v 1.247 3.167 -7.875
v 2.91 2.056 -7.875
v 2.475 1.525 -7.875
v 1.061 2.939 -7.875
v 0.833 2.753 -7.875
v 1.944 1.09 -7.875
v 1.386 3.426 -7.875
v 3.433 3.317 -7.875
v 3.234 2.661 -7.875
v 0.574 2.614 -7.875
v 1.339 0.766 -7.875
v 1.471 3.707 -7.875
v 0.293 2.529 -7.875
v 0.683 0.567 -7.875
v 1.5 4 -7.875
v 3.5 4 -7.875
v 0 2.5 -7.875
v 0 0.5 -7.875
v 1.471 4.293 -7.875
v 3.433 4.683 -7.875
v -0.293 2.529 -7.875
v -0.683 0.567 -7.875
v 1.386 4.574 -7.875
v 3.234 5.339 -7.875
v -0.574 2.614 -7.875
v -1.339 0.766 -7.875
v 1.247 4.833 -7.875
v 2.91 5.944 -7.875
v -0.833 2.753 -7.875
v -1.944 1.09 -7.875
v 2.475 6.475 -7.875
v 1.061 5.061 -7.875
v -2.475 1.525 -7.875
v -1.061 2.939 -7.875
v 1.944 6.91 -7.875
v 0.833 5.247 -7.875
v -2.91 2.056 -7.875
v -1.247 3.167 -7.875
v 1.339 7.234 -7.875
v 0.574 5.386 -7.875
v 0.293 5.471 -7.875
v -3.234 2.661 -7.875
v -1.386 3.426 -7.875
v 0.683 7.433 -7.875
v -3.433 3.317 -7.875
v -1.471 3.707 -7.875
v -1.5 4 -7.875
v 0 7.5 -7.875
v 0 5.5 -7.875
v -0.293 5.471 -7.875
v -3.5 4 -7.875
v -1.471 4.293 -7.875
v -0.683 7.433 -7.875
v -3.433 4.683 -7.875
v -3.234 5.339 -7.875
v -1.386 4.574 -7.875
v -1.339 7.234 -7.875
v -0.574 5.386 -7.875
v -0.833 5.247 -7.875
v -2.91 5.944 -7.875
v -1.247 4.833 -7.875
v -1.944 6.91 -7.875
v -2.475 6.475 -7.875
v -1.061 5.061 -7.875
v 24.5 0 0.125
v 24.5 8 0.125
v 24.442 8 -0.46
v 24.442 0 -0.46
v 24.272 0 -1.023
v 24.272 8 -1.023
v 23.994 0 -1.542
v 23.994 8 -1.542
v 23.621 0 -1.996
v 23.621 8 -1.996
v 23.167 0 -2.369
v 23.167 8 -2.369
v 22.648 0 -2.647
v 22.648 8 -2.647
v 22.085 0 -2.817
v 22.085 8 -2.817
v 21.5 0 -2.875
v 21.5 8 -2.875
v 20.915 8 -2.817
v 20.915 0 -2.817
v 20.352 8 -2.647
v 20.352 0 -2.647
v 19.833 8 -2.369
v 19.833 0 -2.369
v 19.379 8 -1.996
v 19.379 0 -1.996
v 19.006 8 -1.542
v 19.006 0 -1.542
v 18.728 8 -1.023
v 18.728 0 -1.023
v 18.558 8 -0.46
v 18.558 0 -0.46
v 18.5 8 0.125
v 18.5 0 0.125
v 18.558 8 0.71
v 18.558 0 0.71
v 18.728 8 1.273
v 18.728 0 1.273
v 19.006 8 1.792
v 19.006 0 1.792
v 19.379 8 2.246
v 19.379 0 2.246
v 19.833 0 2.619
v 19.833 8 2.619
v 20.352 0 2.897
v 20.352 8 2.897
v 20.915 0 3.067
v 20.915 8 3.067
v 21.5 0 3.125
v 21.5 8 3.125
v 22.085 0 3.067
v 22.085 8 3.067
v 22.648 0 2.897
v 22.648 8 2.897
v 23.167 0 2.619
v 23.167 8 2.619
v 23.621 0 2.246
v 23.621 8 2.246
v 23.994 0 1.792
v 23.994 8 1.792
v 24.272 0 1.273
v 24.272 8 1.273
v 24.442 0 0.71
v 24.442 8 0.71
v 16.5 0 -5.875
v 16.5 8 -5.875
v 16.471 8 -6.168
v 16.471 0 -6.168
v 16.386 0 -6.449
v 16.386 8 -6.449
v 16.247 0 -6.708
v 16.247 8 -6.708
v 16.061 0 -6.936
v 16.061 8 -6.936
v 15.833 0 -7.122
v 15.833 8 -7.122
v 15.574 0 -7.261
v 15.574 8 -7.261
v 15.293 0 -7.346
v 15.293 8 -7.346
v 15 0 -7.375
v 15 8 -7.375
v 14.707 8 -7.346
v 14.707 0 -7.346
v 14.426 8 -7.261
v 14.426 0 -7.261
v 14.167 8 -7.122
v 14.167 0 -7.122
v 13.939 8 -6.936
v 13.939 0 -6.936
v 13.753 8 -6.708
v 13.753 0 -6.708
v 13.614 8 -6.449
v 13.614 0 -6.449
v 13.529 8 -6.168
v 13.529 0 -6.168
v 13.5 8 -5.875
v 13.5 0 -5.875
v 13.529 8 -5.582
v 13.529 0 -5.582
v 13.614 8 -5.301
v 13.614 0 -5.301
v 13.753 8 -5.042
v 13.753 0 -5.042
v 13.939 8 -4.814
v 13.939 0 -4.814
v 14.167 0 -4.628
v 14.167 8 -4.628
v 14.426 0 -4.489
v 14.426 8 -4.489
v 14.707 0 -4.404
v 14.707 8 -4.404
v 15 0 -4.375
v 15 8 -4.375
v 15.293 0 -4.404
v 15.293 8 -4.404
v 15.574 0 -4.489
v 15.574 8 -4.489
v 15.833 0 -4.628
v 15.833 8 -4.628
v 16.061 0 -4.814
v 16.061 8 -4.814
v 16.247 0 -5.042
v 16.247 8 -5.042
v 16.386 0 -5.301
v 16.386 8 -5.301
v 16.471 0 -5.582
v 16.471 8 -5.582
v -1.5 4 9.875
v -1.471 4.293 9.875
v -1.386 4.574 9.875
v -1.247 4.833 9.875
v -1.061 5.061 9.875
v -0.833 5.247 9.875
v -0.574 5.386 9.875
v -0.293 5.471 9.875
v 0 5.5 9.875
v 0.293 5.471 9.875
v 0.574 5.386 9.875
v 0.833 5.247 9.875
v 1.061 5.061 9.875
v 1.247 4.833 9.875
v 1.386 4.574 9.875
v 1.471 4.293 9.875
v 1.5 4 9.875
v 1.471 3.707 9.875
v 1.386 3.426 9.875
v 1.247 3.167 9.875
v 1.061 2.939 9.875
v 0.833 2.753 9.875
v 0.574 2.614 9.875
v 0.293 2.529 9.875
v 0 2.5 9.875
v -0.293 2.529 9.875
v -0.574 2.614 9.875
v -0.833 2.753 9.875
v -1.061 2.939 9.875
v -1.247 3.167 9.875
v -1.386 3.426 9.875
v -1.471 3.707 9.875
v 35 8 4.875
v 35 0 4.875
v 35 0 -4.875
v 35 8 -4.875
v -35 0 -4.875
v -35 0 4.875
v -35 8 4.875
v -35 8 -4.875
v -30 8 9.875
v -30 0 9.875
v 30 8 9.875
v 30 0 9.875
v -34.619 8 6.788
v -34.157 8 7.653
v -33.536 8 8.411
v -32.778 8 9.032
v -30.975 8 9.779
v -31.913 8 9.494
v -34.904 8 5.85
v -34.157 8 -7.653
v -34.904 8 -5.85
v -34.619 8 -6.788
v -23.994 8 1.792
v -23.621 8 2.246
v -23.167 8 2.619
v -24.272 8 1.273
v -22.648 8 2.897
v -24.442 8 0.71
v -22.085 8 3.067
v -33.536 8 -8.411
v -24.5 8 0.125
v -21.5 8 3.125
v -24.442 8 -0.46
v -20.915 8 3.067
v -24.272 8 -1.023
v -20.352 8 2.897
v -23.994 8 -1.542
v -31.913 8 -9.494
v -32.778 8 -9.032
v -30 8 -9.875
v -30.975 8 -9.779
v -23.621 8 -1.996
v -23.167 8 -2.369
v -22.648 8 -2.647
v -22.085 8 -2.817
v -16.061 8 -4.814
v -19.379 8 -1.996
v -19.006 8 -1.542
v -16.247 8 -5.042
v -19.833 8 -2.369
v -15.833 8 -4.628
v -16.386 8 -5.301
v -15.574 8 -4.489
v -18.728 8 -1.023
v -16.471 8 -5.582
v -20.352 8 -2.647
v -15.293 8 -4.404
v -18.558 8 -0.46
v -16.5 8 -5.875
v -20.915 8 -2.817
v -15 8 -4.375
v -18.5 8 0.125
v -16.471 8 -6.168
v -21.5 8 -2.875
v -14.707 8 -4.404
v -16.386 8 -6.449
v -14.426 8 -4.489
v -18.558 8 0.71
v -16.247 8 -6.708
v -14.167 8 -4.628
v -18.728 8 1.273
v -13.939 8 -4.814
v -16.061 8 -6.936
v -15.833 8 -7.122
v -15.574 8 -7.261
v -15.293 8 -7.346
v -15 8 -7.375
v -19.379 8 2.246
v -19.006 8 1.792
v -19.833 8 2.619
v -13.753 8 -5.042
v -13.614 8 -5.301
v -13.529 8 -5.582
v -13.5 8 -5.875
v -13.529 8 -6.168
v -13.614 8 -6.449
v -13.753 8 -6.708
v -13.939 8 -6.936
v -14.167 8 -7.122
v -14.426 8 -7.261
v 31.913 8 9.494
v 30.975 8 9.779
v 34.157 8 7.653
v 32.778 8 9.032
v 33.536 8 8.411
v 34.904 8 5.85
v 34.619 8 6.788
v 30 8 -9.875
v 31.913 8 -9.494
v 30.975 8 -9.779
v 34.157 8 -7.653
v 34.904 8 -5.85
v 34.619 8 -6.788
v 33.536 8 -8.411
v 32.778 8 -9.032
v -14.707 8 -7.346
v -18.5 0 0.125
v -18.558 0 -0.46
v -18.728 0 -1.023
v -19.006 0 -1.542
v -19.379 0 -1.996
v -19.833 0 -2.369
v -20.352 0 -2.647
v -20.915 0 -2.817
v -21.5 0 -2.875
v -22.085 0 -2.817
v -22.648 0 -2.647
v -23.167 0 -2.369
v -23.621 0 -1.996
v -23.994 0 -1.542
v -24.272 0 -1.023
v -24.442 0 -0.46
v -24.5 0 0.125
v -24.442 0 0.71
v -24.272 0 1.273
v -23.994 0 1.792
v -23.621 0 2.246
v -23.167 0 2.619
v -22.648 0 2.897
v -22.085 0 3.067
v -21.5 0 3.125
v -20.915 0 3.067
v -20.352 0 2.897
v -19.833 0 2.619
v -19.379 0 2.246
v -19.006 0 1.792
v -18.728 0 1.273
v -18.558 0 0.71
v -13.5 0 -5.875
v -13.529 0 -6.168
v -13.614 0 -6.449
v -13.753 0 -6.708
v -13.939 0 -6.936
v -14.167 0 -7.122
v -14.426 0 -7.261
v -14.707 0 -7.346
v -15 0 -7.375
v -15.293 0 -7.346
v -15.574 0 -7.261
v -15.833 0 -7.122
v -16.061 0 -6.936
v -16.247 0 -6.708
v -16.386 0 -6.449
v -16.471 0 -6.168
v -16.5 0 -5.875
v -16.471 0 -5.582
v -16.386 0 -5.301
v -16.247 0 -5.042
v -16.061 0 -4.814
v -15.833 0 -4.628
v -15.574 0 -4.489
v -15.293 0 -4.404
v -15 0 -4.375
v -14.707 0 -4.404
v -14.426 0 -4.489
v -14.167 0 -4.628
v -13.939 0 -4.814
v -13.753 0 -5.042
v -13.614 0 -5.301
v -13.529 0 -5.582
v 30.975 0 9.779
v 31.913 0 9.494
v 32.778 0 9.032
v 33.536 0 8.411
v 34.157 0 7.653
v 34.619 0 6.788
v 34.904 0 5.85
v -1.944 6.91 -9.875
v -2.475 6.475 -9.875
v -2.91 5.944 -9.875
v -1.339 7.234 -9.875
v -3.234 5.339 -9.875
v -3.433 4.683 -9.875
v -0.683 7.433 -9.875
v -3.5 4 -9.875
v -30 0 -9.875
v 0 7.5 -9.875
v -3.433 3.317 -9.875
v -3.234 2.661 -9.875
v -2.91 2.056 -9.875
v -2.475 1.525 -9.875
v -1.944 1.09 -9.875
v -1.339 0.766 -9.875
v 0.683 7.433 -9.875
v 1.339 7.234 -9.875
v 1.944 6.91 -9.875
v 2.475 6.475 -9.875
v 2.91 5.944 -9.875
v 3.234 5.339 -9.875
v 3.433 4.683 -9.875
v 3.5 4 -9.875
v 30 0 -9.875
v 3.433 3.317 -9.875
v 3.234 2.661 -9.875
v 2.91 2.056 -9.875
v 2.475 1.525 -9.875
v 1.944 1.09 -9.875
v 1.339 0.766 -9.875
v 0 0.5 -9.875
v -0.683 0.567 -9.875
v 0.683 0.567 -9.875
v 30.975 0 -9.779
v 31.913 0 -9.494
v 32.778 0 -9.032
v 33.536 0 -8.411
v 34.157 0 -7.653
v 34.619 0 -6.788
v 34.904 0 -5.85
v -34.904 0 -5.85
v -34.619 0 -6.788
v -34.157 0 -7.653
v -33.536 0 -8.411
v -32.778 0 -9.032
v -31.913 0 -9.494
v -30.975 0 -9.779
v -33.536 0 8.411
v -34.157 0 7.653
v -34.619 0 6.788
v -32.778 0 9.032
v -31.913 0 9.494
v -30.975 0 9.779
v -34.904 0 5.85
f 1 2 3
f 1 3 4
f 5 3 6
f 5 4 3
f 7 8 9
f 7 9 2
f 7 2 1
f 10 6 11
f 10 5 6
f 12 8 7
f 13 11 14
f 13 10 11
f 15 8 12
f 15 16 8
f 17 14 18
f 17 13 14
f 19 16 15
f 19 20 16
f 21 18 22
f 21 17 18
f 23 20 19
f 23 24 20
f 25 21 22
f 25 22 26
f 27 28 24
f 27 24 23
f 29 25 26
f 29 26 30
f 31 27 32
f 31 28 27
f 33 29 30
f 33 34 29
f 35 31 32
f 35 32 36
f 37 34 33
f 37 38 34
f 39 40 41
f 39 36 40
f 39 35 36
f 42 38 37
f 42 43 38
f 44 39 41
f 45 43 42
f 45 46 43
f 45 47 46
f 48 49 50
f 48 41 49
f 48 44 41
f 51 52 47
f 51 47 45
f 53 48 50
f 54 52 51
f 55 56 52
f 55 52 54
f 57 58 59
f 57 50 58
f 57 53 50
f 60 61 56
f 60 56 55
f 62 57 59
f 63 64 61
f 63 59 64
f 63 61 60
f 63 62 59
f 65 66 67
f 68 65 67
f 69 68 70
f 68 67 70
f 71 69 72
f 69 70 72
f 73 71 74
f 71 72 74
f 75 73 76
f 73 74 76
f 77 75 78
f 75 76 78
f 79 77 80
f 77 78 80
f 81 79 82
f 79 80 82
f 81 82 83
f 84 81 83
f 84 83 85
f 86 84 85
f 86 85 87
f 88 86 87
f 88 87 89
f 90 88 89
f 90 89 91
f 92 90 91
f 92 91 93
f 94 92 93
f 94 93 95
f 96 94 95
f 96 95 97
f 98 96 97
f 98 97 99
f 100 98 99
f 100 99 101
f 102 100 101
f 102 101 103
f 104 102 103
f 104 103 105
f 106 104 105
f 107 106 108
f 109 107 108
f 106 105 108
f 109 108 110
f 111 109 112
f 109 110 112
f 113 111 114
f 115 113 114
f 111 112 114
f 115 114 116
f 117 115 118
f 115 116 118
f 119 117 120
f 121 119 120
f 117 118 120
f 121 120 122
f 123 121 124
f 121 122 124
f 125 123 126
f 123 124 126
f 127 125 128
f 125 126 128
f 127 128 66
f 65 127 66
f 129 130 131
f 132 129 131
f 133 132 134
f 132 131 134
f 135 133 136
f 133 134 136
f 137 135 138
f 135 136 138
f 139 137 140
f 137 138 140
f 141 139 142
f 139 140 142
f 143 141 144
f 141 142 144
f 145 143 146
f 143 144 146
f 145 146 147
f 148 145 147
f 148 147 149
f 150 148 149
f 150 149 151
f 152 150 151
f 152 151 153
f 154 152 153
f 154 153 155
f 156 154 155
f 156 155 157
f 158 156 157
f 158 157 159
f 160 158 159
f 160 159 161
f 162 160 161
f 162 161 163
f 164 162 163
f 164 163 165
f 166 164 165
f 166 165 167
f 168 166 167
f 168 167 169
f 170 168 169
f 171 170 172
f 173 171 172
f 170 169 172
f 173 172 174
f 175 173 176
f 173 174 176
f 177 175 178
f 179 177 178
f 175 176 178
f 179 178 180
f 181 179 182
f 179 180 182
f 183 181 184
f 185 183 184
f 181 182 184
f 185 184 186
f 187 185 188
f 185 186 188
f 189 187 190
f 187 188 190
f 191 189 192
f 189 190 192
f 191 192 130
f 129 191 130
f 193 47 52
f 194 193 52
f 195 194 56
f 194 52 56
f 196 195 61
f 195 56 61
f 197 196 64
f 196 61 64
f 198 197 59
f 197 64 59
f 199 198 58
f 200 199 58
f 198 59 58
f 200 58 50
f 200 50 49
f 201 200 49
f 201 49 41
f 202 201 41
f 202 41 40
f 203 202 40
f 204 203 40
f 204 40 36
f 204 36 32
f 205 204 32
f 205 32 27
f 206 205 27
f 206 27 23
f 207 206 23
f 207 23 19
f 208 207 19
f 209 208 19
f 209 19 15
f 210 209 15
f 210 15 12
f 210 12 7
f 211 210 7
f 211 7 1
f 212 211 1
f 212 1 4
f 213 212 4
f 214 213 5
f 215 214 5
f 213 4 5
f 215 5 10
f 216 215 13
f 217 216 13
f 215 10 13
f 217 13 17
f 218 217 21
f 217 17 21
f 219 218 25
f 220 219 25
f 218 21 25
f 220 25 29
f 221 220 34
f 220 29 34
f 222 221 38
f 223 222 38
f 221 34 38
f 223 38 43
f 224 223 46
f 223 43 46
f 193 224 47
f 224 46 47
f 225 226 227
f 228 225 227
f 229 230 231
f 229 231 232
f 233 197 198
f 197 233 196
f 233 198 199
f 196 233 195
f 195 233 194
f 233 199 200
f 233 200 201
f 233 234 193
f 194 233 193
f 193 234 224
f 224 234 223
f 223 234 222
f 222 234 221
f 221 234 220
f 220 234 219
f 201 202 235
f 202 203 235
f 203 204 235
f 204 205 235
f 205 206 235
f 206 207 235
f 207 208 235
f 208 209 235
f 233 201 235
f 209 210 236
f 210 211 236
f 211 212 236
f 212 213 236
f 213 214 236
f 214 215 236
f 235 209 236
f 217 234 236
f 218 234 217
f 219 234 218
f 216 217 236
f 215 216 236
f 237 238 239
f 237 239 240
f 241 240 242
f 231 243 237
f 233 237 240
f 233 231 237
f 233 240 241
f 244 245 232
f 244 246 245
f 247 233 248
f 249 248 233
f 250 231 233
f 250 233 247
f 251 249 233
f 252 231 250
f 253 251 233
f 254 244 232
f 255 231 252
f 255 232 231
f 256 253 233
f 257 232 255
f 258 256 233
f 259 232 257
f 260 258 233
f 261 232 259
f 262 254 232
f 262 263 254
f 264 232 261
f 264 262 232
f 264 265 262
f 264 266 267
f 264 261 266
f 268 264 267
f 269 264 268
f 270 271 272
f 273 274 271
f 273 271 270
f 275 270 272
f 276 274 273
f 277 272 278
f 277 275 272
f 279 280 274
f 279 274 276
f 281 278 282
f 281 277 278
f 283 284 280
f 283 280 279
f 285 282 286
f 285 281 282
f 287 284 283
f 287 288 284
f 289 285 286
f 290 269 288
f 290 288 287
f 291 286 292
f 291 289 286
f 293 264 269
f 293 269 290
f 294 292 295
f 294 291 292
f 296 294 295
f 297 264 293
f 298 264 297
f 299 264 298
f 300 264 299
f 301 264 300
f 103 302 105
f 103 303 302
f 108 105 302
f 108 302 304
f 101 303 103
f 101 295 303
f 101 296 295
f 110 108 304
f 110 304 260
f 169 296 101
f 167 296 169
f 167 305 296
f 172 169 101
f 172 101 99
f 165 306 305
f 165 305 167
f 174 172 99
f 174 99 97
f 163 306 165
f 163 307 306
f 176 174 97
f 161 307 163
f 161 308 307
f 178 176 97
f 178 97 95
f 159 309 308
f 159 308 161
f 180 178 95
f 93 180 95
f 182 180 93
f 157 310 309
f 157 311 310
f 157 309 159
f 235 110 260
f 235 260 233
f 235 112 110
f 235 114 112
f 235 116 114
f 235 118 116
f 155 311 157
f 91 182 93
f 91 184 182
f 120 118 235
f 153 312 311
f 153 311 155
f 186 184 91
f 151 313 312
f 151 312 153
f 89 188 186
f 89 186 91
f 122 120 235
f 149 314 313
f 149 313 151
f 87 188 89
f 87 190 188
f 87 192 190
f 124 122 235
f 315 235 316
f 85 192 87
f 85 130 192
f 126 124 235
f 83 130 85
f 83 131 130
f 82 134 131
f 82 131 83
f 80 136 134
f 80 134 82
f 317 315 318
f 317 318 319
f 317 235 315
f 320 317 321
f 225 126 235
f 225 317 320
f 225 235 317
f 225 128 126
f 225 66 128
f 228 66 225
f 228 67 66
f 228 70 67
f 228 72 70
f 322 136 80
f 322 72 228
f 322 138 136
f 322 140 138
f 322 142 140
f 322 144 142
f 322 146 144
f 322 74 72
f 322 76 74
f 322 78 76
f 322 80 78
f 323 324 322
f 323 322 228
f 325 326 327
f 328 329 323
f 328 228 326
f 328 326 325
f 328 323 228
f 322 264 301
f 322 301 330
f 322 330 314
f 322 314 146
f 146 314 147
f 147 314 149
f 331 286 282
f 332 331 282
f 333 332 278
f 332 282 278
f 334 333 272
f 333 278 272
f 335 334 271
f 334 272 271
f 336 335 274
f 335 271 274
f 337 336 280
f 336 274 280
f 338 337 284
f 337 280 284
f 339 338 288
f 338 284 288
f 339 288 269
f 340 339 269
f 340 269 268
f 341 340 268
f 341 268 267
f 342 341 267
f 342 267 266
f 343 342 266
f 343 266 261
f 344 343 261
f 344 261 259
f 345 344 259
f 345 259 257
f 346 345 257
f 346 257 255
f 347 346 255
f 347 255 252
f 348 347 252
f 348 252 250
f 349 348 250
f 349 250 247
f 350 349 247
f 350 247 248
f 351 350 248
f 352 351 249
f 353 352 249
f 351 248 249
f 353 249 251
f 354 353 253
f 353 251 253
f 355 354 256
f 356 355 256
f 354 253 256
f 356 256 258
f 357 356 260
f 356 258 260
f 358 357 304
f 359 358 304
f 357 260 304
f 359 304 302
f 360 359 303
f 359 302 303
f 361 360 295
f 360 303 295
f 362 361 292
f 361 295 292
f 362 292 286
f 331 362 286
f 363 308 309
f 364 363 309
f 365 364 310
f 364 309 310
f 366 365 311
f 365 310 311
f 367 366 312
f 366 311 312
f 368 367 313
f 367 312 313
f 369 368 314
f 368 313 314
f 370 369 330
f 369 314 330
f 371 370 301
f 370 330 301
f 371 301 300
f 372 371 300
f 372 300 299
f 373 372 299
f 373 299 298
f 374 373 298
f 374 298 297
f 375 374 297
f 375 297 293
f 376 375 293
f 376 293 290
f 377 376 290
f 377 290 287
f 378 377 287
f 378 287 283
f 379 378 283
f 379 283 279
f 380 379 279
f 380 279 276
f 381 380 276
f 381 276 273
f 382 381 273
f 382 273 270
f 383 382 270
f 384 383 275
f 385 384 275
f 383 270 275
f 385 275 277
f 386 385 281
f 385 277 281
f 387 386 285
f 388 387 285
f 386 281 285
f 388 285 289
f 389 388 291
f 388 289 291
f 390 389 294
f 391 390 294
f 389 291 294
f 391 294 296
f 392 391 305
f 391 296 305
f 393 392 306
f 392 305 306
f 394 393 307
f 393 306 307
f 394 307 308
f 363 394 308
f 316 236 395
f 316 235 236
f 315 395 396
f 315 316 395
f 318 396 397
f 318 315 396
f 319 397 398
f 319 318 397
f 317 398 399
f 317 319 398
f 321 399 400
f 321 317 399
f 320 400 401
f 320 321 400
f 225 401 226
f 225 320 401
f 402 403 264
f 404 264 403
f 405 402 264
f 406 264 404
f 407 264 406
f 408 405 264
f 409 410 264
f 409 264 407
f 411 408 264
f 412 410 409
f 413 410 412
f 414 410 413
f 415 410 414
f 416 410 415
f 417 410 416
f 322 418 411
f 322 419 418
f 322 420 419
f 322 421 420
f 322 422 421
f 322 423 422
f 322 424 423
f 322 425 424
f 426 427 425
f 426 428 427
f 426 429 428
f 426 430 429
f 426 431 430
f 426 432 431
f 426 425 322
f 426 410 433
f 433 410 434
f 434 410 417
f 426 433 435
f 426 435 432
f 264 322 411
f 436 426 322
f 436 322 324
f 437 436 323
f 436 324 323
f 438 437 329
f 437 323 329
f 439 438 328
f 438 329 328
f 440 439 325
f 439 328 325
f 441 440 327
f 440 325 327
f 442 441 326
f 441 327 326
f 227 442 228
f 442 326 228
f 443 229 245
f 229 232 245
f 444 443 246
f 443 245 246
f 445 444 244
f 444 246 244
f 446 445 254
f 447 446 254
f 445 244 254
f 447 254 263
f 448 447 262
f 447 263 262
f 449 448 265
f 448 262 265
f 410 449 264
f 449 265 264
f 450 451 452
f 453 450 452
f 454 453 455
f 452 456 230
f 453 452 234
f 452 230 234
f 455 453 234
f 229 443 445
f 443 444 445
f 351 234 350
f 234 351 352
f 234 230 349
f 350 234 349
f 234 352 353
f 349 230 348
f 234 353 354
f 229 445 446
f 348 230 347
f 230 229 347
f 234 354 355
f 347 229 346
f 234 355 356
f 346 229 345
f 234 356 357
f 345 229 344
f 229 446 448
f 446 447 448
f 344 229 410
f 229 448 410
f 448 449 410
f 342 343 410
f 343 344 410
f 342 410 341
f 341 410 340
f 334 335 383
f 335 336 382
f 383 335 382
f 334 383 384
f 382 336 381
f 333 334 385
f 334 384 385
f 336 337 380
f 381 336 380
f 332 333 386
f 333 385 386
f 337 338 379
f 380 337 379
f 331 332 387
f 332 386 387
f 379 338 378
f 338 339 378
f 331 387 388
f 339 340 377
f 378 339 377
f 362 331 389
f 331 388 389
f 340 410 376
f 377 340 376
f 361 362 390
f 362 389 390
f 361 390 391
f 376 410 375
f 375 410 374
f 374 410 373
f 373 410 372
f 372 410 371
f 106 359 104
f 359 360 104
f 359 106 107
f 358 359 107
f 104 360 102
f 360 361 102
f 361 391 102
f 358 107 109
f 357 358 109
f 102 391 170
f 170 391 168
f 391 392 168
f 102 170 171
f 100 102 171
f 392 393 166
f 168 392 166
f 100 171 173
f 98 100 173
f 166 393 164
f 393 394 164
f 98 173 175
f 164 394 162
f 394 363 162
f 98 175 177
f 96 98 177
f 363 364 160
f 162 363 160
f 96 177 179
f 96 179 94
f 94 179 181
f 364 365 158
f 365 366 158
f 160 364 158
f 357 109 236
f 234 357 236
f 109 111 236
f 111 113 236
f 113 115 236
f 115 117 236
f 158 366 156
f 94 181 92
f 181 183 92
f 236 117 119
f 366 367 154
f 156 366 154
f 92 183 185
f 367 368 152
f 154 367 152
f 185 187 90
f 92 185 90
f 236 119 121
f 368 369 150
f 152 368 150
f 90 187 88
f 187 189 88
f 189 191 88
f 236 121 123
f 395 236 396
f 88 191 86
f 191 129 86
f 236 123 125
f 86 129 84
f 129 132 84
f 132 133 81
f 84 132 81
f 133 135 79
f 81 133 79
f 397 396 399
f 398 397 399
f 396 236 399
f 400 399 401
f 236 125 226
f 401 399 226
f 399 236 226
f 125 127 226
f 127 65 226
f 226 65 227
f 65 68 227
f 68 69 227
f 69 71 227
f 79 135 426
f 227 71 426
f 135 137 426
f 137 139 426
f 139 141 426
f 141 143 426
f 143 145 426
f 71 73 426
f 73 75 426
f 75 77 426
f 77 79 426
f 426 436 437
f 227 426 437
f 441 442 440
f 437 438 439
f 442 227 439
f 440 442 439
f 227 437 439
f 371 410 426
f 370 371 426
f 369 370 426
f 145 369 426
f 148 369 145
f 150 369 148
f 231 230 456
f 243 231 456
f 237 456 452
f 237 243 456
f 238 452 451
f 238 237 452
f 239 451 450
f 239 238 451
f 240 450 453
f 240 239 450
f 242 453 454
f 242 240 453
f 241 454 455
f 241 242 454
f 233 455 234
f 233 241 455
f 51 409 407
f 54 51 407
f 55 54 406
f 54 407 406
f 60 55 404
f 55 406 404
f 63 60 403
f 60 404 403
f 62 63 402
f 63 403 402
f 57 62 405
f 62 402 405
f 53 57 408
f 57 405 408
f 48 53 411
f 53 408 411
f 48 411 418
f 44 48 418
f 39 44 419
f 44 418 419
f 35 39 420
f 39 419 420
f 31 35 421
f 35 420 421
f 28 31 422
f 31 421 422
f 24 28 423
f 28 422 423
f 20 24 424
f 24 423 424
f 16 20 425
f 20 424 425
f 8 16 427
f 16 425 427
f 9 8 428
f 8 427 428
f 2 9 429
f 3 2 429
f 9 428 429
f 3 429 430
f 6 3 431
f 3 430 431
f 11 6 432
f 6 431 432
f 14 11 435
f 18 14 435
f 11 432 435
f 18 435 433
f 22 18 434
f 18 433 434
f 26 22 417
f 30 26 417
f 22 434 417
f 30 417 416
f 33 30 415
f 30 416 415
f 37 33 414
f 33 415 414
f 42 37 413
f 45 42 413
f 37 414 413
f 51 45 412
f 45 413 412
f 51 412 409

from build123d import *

# Parameters (mm, degrees)
SKETCH_1_W          = 70
SKETCH_1_H          = 19.75
EXTRUDE_1_DEPTH     = 8
SKETCH_2_R          = 3
CUT_EXTRUDE_1_DEPTH = 9
SKETCH_9_R          = 1.5
CUT_EXTRUDE_7_DEPTH = 9
SKETCH_10_R         = 1.5
CUT_EXTRUDE_8_DEPTH = 20.75
FILLET_1_R          = 5
SKETCH_11_R         = 3.5
CUT_EXTRUDE_9_DEPTH = 2


with BuildPart() as part:
    # 草图1 → 凸台-拉伸1 (new body)
    with BuildSketch(Plane(origin=(0, 0, 0), x_dir=(1, 0, 0), z_dir=(0, 1, 0))):
        Rectangle(SKETCH_1_W, SKETCH_1_H)
    extrude(amount=EXTRUDE_1_DEPTH)

    # 草图2 → 切除-拉伸1 (cut, through all)
    with BuildSketch(Plane(origin=(0, 8, 0), x_dir=(1, 0, 0), z_dir=(0, 1, 0))):
        with Locations((-21.5, -0.125)):
            Circle(SKETCH_2_R)
        with Locations((21.5, -0.125)):
            Circle(SKETCH_2_R)
    extrude(amount=-CUT_EXTRUDE_1_DEPTH, mode=Mode.SUBTRACT)

    # 草图9 → 切除-拉伸7 (cut, through all)
    with BuildSketch(Plane(origin=(0, 8, 0), x_dir=(1, 0, 0), z_dir=(0, 1, 0))):
        with Locations((-15, 5.875)):
            Circle(SKETCH_9_R)
        with Locations((15, 5.875)):
            Circle(SKETCH_9_R)
    extrude(amount=-CUT_EXTRUDE_7_DEPTH, mode=Mode.SUBTRACT)

    # 草图10 → 切除-拉伸8 (cut, through all)
    with BuildSketch(Plane(origin=(0, 0, -9.875), x_dir=(-1, 0, 0), z_dir=(0, 0, -1))):
        with Locations((0, 4)):
            Circle(SKETCH_10_R)
    extrude(amount=-CUT_EXTRUDE_8_DEPTH, mode=Mode.SUBTRACT)

    # 圆角1
    fillet_1_edges = [part.edges().sort_by_distance(p)[0] for p in [
        (35, 4, 9.875),
        (-35, 4, 9.875),
        (-35, 4, -9.875),
        (35, 4, -9.875),
    ]]
    fillet(fillet_1_edges, radius=FILLET_1_R)

    # 草图11 → 切除-拉伸9 (cut)
    with BuildSketch(Plane(origin=(0, 0, -9.875), x_dir=(-1, 0, 0), z_dir=(0, 0, -1))):
        with Locations((0, 4)):
            Circle(SKETCH_11_R)
    extrude(amount=-CUT_EXTRUDE_9_DEPTH, mode=Mode.SUBTRACT)


solid = part.part
